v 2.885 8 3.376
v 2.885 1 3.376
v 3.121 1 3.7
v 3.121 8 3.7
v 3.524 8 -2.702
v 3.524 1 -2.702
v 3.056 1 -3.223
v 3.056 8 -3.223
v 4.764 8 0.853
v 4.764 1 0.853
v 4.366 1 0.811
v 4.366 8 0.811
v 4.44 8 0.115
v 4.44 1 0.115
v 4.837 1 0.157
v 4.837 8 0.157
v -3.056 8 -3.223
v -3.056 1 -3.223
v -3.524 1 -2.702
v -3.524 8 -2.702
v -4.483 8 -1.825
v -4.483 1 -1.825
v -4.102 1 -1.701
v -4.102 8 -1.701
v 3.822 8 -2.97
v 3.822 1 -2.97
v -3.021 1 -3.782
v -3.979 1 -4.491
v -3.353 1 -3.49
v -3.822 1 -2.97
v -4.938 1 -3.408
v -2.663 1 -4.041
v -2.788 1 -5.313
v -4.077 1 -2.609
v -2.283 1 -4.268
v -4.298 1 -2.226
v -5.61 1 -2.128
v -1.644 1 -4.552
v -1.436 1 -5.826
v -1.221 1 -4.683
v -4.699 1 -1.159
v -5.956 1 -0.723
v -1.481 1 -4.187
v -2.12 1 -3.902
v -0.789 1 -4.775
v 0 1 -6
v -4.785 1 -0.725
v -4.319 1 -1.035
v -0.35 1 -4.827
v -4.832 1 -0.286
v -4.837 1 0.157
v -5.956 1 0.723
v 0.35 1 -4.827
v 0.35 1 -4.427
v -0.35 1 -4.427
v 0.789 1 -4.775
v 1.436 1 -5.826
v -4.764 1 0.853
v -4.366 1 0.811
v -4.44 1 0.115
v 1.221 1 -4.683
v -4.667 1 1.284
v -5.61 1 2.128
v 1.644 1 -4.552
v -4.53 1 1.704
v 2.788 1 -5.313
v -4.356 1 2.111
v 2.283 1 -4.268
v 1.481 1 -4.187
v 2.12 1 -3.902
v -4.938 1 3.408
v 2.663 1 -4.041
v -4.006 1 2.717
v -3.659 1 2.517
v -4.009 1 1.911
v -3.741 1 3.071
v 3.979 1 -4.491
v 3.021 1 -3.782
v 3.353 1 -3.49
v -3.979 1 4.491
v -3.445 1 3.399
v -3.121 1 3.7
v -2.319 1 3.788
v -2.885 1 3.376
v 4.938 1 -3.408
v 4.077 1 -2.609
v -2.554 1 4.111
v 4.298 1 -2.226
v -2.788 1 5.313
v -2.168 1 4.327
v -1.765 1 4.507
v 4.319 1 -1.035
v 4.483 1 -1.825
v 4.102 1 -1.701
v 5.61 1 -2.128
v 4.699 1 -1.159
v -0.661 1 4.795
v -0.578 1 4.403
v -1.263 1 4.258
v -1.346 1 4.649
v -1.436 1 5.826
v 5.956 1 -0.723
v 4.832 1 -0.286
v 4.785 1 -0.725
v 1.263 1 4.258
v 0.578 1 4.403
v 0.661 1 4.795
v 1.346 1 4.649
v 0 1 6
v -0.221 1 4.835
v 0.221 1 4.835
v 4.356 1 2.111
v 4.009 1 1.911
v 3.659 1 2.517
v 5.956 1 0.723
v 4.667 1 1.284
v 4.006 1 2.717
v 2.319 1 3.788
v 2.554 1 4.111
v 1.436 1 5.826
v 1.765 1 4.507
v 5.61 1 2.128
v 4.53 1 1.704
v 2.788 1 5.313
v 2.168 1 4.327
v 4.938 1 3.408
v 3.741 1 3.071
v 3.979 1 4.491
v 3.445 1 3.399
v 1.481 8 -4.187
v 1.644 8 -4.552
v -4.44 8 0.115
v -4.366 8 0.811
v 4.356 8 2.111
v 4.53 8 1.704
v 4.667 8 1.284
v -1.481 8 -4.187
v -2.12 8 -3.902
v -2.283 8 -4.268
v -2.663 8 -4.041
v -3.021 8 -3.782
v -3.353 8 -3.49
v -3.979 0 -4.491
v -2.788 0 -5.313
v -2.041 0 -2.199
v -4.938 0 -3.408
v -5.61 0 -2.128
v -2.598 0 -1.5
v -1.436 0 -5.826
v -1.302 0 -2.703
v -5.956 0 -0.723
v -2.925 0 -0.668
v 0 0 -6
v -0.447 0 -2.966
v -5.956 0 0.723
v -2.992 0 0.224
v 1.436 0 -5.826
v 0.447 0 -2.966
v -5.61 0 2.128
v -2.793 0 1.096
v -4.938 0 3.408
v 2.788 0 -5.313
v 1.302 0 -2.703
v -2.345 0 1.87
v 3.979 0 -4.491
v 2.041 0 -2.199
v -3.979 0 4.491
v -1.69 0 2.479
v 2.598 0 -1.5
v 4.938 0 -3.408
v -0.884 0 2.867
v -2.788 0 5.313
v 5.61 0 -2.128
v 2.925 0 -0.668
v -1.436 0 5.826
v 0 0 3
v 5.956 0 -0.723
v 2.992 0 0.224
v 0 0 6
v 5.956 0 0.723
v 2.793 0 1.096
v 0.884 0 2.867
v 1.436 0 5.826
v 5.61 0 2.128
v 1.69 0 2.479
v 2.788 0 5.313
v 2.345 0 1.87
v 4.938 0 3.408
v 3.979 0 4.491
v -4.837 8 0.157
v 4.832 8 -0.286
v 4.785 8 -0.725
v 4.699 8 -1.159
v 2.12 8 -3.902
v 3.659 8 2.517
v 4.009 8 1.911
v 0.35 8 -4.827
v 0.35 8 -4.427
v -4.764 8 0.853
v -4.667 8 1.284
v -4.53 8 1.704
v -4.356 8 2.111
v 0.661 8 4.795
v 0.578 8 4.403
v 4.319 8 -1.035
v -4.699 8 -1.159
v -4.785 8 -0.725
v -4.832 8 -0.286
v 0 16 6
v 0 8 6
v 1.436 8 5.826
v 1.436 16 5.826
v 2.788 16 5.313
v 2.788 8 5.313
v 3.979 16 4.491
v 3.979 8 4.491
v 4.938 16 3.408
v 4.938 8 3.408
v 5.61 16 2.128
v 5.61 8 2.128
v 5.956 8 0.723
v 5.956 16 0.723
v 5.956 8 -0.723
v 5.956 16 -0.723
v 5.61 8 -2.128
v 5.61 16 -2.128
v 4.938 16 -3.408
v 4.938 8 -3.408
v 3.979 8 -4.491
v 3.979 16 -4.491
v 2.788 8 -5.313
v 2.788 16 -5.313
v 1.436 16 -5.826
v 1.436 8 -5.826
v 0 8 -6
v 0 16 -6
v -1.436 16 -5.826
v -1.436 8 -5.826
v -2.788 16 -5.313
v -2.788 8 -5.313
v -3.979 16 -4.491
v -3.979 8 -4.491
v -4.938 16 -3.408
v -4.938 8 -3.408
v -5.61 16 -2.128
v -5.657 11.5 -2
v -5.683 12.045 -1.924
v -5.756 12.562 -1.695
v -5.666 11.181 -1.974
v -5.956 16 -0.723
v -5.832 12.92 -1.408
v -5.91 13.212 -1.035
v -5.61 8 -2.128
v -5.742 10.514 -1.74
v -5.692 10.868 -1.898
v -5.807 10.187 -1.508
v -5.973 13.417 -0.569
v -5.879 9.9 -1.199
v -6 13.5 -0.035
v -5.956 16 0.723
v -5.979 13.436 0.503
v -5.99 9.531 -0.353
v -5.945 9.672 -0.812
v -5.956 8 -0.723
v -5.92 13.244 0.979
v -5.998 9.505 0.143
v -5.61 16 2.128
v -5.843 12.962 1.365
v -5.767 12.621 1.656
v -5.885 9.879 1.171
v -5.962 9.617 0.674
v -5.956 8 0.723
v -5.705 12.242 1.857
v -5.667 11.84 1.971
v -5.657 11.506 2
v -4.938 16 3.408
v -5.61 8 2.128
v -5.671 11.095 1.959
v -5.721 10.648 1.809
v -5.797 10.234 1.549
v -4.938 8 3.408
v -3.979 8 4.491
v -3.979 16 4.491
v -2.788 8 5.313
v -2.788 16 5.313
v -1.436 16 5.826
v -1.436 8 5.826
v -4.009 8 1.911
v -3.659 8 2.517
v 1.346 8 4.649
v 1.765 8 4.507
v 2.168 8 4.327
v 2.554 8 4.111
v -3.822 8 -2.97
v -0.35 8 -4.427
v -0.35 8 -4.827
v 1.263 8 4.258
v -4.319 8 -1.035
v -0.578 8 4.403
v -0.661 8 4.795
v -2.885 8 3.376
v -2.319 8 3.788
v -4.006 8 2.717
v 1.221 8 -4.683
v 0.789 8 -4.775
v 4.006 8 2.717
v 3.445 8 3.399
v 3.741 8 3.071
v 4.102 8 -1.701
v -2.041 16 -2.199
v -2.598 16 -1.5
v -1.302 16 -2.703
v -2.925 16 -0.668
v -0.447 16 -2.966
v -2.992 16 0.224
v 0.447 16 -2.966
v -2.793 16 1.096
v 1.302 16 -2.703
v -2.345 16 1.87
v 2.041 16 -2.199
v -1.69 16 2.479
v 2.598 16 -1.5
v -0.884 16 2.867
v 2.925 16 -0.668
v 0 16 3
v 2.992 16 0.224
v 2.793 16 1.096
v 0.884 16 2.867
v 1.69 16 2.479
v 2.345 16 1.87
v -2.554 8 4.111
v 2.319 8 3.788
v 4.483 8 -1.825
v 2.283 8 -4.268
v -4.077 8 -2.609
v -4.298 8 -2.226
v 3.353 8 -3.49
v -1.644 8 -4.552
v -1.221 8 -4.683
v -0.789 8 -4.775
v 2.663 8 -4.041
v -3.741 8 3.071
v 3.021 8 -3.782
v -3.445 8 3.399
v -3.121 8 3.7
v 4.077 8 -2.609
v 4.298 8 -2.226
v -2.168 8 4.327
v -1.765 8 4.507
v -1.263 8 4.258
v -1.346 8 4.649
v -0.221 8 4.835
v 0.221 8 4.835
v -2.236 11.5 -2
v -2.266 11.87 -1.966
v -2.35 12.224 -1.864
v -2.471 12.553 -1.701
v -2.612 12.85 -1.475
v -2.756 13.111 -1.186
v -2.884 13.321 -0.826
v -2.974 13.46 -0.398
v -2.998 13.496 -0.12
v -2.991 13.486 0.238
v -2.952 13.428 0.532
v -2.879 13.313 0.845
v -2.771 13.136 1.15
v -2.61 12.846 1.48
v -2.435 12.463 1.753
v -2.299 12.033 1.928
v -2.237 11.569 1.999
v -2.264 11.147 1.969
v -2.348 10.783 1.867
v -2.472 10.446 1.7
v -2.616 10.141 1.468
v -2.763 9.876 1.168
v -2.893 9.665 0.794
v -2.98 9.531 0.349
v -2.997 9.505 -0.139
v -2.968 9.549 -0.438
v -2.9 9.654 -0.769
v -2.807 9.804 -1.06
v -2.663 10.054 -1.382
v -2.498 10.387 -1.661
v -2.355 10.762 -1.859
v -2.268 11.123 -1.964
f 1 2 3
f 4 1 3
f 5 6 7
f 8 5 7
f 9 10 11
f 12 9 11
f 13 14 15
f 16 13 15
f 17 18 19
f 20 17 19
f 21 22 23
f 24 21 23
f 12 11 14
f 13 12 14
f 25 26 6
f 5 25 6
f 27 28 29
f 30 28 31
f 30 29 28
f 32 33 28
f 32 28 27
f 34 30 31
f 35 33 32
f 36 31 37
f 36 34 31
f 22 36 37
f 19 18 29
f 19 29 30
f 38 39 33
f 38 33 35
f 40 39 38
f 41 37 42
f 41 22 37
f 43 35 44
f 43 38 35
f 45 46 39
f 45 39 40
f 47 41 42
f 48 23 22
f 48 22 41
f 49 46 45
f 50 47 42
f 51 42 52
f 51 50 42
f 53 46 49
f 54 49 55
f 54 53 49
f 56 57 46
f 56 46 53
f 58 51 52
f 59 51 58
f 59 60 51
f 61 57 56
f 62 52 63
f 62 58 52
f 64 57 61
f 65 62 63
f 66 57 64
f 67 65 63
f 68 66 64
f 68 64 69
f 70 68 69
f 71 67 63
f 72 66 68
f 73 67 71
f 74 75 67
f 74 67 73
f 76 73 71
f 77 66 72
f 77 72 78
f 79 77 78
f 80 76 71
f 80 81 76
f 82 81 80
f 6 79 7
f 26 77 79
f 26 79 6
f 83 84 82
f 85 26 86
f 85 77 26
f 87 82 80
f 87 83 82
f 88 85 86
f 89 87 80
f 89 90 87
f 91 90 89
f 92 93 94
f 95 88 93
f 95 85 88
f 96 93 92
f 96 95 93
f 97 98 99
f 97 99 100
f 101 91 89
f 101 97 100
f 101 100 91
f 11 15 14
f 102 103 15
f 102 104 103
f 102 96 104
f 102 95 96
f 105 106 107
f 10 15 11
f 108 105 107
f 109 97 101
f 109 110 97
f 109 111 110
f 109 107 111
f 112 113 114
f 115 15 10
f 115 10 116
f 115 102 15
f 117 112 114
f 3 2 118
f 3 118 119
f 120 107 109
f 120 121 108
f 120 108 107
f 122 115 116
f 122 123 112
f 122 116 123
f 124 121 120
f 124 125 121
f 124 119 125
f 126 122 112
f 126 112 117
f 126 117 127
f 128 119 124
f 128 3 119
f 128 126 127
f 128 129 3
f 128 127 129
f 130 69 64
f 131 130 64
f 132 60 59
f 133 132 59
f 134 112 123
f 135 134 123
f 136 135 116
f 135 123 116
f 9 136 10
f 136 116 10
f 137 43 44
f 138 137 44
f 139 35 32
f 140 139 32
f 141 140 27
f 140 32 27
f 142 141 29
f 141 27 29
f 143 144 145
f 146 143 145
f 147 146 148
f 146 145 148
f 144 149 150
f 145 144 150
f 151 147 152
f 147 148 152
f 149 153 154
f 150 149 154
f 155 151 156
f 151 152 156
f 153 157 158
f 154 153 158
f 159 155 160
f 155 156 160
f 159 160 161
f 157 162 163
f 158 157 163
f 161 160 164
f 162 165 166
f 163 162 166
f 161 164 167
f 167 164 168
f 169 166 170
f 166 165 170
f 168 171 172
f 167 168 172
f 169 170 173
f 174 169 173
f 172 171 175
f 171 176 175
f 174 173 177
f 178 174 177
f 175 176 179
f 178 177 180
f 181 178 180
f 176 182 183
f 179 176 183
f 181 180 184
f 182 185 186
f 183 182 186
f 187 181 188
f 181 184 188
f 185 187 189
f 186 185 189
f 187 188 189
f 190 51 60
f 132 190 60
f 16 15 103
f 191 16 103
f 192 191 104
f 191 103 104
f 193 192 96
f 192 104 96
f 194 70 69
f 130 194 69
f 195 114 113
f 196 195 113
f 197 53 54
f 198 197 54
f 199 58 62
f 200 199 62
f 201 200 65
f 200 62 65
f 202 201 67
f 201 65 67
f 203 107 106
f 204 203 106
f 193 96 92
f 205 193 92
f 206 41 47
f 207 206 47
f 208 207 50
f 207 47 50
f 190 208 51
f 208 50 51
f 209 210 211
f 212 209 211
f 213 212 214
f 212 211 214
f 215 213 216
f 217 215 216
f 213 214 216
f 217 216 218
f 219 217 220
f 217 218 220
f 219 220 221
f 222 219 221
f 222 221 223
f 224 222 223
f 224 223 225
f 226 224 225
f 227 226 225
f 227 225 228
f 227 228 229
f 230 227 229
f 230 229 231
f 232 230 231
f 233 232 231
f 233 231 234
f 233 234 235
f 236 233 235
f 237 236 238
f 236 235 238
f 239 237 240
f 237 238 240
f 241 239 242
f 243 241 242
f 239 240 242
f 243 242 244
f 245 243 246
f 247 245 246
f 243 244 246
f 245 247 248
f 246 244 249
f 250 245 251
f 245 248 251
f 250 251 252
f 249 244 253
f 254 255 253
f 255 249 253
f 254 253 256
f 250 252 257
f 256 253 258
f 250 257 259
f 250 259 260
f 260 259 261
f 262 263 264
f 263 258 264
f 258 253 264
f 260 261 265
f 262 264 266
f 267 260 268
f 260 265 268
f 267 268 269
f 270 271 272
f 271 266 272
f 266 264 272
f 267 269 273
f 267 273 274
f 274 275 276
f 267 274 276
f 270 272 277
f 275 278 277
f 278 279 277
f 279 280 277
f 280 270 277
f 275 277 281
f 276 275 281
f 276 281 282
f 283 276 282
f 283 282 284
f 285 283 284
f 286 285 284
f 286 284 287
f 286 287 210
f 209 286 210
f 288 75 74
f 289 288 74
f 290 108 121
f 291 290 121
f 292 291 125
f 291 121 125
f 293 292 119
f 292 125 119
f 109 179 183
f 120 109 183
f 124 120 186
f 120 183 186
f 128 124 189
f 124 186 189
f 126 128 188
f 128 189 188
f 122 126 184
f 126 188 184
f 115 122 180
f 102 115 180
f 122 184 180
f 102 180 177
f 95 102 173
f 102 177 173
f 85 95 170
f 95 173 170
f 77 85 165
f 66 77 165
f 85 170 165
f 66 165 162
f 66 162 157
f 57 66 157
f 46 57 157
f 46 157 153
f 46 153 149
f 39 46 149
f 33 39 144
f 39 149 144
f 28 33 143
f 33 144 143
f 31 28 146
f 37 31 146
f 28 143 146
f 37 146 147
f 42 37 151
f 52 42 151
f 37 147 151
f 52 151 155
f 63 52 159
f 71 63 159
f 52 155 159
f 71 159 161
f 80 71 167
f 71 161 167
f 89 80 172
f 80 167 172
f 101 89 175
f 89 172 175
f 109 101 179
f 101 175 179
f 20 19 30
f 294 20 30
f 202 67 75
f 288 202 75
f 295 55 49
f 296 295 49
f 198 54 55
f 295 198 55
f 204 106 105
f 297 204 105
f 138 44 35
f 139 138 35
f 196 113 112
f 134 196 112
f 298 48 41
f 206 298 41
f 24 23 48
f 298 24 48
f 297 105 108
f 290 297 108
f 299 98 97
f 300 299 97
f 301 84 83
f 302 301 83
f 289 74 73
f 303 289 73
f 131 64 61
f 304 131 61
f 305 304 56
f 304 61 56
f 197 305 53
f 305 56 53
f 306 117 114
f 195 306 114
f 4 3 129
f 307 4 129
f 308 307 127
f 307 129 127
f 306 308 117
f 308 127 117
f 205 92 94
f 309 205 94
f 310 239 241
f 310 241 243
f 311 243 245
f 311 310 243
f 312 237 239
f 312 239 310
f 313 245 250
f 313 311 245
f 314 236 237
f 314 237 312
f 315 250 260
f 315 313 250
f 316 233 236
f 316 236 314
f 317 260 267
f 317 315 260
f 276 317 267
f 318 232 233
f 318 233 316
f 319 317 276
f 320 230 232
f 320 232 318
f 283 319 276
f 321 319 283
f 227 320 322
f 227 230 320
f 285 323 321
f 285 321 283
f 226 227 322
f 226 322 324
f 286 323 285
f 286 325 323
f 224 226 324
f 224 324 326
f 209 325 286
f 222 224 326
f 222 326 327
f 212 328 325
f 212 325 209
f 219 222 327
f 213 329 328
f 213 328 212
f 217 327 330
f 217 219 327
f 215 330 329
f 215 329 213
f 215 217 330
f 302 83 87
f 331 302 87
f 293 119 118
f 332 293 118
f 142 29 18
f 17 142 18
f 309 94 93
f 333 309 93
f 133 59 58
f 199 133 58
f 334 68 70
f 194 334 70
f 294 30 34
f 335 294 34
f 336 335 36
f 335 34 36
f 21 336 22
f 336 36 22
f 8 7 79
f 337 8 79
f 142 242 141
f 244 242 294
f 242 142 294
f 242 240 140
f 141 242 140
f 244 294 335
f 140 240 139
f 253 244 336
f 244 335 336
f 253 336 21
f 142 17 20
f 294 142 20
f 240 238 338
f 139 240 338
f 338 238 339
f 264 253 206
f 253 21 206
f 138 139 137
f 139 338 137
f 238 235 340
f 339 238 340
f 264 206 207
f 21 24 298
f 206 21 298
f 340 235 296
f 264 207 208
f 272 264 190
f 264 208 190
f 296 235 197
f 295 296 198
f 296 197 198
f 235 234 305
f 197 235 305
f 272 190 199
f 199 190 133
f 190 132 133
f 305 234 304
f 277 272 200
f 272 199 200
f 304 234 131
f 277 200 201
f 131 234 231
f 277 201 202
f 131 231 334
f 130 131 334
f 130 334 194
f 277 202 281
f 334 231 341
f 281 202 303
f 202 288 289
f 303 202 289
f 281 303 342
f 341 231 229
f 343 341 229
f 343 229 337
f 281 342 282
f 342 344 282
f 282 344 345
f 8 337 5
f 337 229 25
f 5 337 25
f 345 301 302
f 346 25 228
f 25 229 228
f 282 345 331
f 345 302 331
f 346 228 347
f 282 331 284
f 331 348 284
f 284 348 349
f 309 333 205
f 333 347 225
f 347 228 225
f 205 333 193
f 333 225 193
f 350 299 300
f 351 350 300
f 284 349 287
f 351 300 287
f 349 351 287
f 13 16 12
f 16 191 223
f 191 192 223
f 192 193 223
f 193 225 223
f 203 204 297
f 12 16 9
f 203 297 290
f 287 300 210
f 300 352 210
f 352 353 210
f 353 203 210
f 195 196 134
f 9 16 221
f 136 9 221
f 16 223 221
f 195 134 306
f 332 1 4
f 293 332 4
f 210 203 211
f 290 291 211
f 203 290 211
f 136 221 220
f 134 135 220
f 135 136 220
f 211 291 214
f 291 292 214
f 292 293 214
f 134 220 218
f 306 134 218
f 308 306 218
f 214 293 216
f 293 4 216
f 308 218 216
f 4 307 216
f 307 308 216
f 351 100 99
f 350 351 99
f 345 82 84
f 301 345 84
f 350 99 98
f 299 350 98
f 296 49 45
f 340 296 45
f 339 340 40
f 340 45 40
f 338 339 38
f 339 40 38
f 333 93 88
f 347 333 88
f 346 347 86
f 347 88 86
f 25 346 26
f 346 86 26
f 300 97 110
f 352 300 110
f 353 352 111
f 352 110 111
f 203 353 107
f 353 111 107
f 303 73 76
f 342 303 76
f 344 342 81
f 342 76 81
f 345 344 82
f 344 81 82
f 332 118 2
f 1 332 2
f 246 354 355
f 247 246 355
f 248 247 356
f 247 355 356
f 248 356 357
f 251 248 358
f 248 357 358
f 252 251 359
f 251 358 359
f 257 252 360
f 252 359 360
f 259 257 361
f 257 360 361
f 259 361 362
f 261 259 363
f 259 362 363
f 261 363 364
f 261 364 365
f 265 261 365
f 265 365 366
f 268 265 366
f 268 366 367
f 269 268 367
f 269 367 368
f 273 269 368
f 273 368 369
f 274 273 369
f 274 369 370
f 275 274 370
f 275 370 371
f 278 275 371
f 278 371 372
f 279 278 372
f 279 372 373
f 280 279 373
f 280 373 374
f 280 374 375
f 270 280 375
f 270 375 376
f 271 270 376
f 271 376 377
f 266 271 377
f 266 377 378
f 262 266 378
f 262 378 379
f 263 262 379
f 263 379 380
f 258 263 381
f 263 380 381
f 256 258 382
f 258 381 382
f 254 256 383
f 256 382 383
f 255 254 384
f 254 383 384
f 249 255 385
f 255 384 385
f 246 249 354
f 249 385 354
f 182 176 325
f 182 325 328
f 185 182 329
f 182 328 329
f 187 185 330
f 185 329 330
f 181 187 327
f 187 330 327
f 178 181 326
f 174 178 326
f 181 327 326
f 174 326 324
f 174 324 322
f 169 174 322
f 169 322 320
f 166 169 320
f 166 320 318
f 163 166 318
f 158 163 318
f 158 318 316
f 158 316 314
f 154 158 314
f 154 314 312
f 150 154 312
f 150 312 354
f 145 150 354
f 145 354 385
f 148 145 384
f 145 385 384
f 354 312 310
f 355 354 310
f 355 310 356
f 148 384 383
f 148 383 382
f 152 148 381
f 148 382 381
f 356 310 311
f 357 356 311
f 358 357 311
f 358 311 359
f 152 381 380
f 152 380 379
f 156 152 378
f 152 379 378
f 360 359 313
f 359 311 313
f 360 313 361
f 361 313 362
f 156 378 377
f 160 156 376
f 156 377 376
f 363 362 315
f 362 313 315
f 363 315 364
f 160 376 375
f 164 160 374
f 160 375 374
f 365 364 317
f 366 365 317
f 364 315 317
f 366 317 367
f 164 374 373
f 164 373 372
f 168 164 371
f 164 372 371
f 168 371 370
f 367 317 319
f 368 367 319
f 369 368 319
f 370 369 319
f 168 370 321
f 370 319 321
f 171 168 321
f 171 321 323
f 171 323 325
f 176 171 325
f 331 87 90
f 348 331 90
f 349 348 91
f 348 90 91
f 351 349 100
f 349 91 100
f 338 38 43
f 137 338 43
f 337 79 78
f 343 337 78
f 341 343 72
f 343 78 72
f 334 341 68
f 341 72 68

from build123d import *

# Parameters (mm, degrees)
SKETCH_1_R               = 6
EXTRUDE_1_DEPTH          = 1
EXTRUDE_2_DEPTH          = 7
SKETCH_3_R               = 6
EXTRUDE_3_DEPTH          = 8
CUT_EXTRUDE_1_REACH      = 20.111
SKETCH_4_R               = 3
CUT_EXTRUDE_2_REACH      = 20.111
CUT_EXTRUDE_2_END_RADIUS = 6
SKETCH_5_R               = 2


with BuildPart() as part:
    # 草图1 → 凸台-拉伸1 (new body)
    with BuildSketch(Plane(origin=(0, 0, 0), x_dir=(1, 0, 0), z_dir=(0, 1, 0))):
        with Locations(Location((0, 0, 0), (0, 0, 270))):
            Circle(SKETCH_1_R)
    extrude(amount=EXTRUDE_1_DEPTH)

    # 草图2 → 凸台-拉伸2 (add)
    with BuildSketch(Plane(origin=(0, 1, 0), x_dir=(1, 0, 0), z_dir=(0, 1, 0))):
        with BuildLine():
            Line((-0.35, 4.427328454), (-0.35, 4.827328454))
            ThreePointArc((-0.35, 4.827328454), (-1.006292584, 4.734234388), (-1.64371046, 4.552341807))
            Line((-1.64371046, 4.552341807), (-1.481015803, 4.186923623))
            Line((-1.481015803, 4.186923623), (-2.120497623, 3.902207973))
            Line((-2.120497623, 3.902207973), (-2.28319228, 4.267626156))
            ThreePointArc((-2.28319228, 4.267626156), (-2.844880621, 3.915642253), (-3.353208449, 3.490213904))
            Line((-3.353208449, 3.490213904), (-3.055950519, 3.222561662))
            Line((-3.055950519, 3.222561662), (-3.524341943, 2.702360284))
            Line((-3.524341943, 2.702360284), (-3.821599873, 2.970012526))
            ThreePointArc((-3.821599873, 2.970012526), (-4.191562954, 2.42), (-4.482906234, 1.82459631))
            Line((-4.482906234, 1.82459631), (-4.102483628, 1.700989513))
            Line((-4.102483628, 1.700989513), (-4.318795524, 1.035249951))
            Line((-4.318795524, 1.035249951), (-4.69921813, 1.158856749))
            ThreePointArc((-4.69921813, 1.158856749), (-4.813485974, 0.505917762), (-4.837468805, -0.156510562))
            Line((-4.837468805, -0.156510562), (-4.439660047, -0.114699176))
            Line((-4.439660047, -0.114699176), (-4.366490123, -0.810864503))
            Line((-4.366490123, -0.810864503), (-4.764298881, -0.852675888))
            ThreePointArc((-4.764298881, -0.852675888), (-4.603113539, -1.495642253), (-4.355589073, -2.110555336))
            Line((-4.355589073, -2.110555336), (-4.009178912, -1.910555336))
            Line((-4.009178912, -1.910555336), (-3.659178912, -2.516773118))
            Line((-3.659178912, -2.516773118), (-4.005589073, -2.716773118))
            ThreePointArc((-4.005589073, -2.716773118), (-3.596820955, -3.238592135), (-3.120588421, -3.699665918))
            Line((-3.120588421, -3.699665918), (-2.88547432, -3.37605912))
            Line((-2.88547432, -3.37605912), (-2.319162424, -3.787508797))
            Line((-2.319162424, -3.787508797), (-2.554276525, -4.111115595))
            ThreePointArc((-2.554276525, -4.111115595), (-1.968605352, -4.421560015), (-1.346009681, -4.649070653))
            Line((-1.346009681, -4.649070653), (-1.262845005, -4.257811613))
            Line((-1.262845005, -4.257811613), (-0.578141684, -4.403349796))
            Line((-0.578141684, -4.403349796), (-0.661306361, -4.794608837))
            ThreePointArc((-0.661306361, -4.794608837), (0, -4.84), (0.661306361, -4.794608837))
            Line((0.661306361, -4.794608837), (0.578141684, -4.403349796))
            Line((0.578141684, -4.403349796), (1.262845005, -4.257811613))
            Line((1.262845005, -4.257811613), (1.346009681, -4.649070653))
            ThreePointArc((1.346009681, -4.649070653), (1.968605352, -4.421560015), (2.554276525, -4.111115595))
            Line((2.554276525, -4.111115595), (2.319162424, -3.787508797))
            Line((2.319162424, -3.787508797), (2.88547432, -3.37605912))
            Line((2.88547432, -3.37605912), (3.120588421, -3.699665918))
            ThreePointArc((3.120588421, -3.699665918), (3.596820955, -3.238592135), (4.005589073, -2.716773118))
            Line((4.005589073, -2.716773118), (3.659178912, -2.516773118))
            Line((3.659178912, -2.516773118), (4.009178912, -1.910555336))
            Line((4.009178912, -1.910555336), (4.355589073, -2.110555336))
            ThreePointArc((4.355589073, -2.110555336), (4.603113539, -1.495642253), (4.764298881, -0.852675888))
            Line((4.764298881, -0.852675888), (4.366490123, -0.810864503))
            Line((4.366490123, -0.810864503), (4.439660047, -0.114699176))
            Line((4.439660047, -0.114699176), (4.837468805, -0.156510562))
            ThreePointArc((4.837468805, -0.156510562), (4.813485974, 0.505917762), (4.69921813, 1.158856749))
            Line((4.69921813, 1.158856749), (4.318795524, 1.035249951))
            Line((4.318795524, 1.035249951), (4.102483628, 1.700989513))
            Line((4.102483628, 1.700989513), (4.482906234, 1.82459631))
            ThreePointArc((4.482906234, 1.82459631), (4.191562954, 2.42), (3.821599873, 2.970012526))
            Line((3.821599873, 2.970012526), (3.524341943, 2.702360284))
            Line((3.524341943, 2.702360284), (3.055950519, 3.222561662))
            Line((3.055950519, 3.222561662), (3.353208449, 3.490213904))
            ThreePointArc((3.353208449, 3.490213904), (2.844880621, 3.915642253), (2.28319228, 4.267626156))
            Line((2.28319228, 4.267626156), (2.120497623, 3.902207973))
            Line((2.120497623, 3.902207973), (1.481015803, 4.186923623))
            Line((1.481015803, 4.186923623), (1.64371046, 4.552341807))
            ThreePointArc((1.64371046, 4.552341807), (1.006292584, 4.734234388), (0.35, 4.827328454))
            Line((0.35, 4.827328454), (0.35, 4.427328454))
            Line((0.35, 4.427328454), (-0.35, 4.427328454))
        make_face()
    extrude(amount=EXTRUDE_2_DEPTH)

    # 草图3 → 凸台-拉伸3 (add)
    with BuildSketch(Plane(origin=(0, 8, 0), x_dir=(1, 0, 0), z_dir=(0, 1, 0))):
        with Locations(Location((0, 0, 0), (0, 0, 270))):
            Circle(SKETCH_3_R)
    extrude(amount=EXTRUDE_3_DEPTH)

    # 草图4 → 切除-拉伸1 (cut, up to next)
    with BuildSketch(Plane(origin=(0, 16, 0), x_dir=(1, 0, 0), z_dir=(0, 1, 0)), mode=Mode.PRIVATE) as cut_extrude_1_sk1:
        with Locations(Location((0, 0, 0), (0, 0, 270))):
            Circle(SKETCH_4_R)
    cut_extrude_1_tool1 = extrude(cut_extrude_1_sk1.sketch, amount=-CUT_EXTRUDE_1_REACH, mode=Mode.PRIVATE) & part.part
    add(cut_extrude_1_tool1.solids().sort_by_distance((0, 16, 0))[0], mode=Mode.SUBTRACT)

    # 切除-拉伸2: up to this cylinder (the profile starts inside it)
    cut_extrude_2_end = Plane(origin=(0, 11.5, 0), z_dir=(0, -1, 0)) * Cylinder(CUT_EXTRUDE_2_END_RADIUS, 53.222, mode=Mode.PRIVATE)
    # 草图5 → 切除-拉伸2 (cut, up to the surface)
    with BuildSketch(Plane(origin=(0, 0, 0), x_dir=(0, 0, -1), z_dir=(1, 0, 0)), mode=Mode.PRIVATE) as cut_extrude_2_sk1:
        with Locations((0, 11.5)):
            Circle(SKETCH_5_R)
    cut_extrude_2_tool1 = extrude(cut_extrude_2_sk1.sketch, amount=-CUT_EXTRUDE_2_REACH, mode=Mode.PRIVATE) & cut_extrude_2_end
    add(cut_extrude_2_tool1.solids().sort_by_distance((0, 11.5, 0))[0], mode=Mode.SUBTRACT)


solid = part.part
